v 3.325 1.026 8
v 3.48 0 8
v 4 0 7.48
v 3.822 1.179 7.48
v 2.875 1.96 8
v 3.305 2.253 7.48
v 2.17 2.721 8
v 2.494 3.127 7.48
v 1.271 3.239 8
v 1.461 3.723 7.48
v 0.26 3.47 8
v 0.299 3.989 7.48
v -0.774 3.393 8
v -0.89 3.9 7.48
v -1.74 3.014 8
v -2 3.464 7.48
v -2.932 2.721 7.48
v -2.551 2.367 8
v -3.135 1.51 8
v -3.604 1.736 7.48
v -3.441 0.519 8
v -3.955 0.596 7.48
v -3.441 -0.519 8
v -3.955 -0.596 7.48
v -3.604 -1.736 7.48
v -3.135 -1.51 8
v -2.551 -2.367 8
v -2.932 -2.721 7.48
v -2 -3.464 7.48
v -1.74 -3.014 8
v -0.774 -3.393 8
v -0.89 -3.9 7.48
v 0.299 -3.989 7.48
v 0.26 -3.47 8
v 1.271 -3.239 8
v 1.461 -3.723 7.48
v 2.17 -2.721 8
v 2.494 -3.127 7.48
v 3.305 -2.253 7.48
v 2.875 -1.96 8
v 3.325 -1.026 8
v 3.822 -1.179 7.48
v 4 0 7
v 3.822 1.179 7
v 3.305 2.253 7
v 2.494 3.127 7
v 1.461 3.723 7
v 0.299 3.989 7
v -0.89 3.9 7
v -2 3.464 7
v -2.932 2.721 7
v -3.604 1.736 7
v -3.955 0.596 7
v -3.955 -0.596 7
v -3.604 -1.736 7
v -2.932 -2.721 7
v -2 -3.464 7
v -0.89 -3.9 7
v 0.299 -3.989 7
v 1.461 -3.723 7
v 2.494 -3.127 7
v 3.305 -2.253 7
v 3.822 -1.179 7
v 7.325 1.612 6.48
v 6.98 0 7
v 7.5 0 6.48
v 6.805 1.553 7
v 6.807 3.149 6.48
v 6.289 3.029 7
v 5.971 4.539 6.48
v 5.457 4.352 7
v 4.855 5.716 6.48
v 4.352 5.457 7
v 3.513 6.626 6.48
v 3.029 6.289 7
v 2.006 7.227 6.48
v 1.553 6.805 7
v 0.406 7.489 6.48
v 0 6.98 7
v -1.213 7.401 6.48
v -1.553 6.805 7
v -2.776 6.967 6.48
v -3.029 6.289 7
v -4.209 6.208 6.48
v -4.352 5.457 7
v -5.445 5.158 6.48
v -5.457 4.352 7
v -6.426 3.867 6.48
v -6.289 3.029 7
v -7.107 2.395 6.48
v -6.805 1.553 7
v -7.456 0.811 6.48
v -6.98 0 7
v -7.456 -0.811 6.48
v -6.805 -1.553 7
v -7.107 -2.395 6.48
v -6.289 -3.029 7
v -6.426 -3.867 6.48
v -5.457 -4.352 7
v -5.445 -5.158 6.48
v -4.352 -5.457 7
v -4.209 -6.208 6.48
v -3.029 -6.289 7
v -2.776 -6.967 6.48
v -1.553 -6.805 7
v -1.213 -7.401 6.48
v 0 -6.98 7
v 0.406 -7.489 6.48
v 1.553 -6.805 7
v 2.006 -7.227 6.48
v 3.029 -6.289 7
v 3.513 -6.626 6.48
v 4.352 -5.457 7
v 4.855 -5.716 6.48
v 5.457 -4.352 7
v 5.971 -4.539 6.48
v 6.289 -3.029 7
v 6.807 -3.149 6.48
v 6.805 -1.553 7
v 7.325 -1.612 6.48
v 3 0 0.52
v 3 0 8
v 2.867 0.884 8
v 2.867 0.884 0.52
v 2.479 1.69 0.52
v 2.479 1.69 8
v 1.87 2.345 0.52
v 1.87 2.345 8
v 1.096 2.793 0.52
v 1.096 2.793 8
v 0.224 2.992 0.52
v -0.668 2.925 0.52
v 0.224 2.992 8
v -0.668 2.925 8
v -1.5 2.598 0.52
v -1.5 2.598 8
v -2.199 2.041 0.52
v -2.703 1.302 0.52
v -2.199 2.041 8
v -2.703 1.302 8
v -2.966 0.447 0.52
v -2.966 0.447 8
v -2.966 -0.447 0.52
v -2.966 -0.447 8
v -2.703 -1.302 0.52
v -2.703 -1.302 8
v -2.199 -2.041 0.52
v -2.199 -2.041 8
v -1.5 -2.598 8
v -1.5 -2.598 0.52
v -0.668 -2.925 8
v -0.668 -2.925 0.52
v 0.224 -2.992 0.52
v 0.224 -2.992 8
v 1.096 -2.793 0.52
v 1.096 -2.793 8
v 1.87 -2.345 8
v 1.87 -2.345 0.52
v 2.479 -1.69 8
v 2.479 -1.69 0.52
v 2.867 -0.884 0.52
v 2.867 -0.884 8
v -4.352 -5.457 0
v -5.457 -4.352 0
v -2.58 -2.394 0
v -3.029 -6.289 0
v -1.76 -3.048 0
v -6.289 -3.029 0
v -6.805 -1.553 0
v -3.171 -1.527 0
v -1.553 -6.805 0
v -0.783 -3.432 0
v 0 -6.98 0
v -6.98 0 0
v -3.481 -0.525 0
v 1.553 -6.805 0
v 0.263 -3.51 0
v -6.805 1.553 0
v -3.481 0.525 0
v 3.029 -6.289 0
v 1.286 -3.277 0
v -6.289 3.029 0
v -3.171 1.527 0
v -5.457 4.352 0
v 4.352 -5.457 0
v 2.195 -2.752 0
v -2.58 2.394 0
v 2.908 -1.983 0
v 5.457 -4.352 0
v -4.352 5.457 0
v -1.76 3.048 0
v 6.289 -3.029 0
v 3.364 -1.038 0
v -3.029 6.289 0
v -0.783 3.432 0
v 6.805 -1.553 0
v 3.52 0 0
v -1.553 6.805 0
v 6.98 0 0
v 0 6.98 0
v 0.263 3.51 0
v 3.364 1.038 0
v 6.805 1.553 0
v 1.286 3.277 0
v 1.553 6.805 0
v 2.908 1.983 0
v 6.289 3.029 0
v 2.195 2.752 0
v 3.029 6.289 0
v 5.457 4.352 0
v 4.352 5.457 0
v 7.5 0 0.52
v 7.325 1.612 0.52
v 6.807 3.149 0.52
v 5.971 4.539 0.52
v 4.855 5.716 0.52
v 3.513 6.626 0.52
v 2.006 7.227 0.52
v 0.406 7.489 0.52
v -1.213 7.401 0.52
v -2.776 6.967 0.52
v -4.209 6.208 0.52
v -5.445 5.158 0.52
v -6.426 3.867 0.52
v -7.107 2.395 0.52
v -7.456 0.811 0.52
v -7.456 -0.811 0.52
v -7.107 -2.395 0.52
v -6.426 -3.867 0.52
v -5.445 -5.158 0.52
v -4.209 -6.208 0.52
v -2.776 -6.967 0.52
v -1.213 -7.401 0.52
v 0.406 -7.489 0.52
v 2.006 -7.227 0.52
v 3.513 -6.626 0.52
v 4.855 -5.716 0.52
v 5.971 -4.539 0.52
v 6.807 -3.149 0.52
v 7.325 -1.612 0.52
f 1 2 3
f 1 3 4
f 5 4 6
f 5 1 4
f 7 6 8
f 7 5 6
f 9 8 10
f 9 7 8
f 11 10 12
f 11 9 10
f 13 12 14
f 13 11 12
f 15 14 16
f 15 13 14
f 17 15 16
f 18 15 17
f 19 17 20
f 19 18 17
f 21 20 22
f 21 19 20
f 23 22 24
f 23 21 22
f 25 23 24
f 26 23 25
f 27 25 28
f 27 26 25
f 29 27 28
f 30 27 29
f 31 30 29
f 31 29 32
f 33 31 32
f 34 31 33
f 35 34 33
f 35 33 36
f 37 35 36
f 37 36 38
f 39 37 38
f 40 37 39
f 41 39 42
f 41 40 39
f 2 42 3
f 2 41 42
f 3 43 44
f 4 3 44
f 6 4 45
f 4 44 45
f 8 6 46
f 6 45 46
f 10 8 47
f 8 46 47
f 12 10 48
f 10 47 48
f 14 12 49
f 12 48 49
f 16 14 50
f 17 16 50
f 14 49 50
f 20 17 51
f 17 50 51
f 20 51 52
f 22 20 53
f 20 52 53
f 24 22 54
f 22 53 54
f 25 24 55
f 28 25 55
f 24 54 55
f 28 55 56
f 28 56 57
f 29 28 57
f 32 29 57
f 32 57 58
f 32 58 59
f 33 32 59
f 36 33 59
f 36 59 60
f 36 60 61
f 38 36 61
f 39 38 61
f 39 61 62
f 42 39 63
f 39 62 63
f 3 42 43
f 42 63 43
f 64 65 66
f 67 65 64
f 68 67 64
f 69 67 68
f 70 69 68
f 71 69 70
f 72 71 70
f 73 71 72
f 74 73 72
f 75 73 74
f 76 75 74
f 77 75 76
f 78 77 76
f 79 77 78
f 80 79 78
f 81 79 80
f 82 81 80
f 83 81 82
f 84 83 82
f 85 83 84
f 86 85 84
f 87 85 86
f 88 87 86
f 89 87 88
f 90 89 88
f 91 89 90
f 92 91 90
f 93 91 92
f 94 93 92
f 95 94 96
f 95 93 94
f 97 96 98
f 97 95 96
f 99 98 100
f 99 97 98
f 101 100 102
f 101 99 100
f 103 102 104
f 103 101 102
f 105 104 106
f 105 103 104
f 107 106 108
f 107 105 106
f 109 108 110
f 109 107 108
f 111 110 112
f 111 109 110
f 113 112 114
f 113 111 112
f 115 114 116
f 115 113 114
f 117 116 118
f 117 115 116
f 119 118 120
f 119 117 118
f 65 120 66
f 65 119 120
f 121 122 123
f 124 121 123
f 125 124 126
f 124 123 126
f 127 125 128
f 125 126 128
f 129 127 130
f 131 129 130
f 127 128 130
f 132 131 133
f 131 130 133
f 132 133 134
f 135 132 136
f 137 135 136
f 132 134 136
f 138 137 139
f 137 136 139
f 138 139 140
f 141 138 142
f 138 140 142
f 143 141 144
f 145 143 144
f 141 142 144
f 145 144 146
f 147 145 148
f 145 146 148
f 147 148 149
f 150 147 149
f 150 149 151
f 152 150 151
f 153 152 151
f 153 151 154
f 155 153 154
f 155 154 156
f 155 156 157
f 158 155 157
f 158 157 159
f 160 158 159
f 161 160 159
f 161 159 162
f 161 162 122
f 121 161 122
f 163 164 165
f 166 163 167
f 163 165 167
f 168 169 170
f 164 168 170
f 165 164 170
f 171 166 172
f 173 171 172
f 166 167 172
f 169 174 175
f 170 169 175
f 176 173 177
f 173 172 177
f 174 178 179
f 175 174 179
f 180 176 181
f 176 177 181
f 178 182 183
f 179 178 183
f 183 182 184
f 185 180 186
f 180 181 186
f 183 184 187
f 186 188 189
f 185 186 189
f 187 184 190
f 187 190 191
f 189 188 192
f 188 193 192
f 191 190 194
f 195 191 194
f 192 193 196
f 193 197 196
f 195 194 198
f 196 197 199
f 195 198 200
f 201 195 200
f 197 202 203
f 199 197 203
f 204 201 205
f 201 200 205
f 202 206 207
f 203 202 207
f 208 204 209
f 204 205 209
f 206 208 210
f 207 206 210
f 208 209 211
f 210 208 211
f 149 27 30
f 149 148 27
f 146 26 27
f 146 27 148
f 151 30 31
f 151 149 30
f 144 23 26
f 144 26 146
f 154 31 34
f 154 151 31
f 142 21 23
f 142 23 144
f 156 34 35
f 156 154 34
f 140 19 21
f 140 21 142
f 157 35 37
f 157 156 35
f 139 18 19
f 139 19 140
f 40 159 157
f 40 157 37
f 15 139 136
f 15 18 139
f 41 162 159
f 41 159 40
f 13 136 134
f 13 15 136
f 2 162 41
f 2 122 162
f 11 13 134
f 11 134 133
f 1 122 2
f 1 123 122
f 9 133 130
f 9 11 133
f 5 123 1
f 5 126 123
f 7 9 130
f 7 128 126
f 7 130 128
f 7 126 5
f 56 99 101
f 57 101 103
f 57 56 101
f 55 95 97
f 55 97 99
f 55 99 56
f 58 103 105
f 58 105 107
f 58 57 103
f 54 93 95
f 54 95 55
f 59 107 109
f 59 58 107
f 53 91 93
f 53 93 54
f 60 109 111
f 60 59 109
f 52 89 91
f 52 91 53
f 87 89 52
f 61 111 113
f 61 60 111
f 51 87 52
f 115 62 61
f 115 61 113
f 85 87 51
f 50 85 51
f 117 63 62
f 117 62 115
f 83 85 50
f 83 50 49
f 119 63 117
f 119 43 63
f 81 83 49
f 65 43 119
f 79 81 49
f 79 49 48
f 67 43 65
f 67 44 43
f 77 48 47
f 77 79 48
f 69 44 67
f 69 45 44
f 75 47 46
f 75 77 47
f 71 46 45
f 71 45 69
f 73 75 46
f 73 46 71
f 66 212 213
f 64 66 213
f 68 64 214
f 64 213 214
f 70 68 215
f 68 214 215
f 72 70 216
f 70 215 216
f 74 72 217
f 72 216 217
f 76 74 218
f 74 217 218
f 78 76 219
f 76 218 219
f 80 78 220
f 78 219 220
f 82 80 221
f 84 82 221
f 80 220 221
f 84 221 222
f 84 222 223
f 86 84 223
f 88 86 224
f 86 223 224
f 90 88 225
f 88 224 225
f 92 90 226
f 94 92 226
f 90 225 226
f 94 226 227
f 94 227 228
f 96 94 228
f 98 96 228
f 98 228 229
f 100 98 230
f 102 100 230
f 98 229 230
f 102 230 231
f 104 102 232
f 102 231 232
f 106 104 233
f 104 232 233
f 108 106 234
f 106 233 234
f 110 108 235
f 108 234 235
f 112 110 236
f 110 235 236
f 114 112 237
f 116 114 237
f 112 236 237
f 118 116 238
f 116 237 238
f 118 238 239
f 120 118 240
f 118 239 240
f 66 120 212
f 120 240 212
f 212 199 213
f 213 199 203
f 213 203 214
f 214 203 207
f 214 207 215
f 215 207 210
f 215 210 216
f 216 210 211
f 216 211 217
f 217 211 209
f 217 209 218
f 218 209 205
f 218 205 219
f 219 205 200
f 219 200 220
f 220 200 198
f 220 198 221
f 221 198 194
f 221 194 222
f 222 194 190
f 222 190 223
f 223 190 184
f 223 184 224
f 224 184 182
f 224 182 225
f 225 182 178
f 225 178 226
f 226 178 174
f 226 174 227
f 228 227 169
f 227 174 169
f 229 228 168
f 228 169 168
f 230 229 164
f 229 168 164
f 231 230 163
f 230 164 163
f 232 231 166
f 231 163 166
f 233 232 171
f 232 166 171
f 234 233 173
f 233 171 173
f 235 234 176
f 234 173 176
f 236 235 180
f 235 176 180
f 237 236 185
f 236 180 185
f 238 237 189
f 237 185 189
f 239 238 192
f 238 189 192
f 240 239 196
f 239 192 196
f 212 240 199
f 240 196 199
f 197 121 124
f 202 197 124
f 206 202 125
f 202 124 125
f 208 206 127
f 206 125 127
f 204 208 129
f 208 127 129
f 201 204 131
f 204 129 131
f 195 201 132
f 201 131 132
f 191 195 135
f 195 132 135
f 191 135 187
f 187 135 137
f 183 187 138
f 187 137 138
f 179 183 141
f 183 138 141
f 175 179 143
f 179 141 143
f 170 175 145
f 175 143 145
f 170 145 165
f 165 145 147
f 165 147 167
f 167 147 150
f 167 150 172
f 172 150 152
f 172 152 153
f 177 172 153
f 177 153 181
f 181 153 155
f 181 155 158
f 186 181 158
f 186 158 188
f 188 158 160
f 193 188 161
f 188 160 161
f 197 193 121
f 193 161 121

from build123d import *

# Parameters (mm, degrees)
SKETCH1_R           = 7.5
BOSS_EXTRUDE1_DEPTH = 7
SKETCH2_R           = 4
BOSS_EXTRUDE2_DEPTH = 1
SKETCH3_R           = 3
CUT_EXTRUDE1_DEPTH  = 9
CHAMFER1_SIZE       = 0.52


with BuildPart() as part:
    # Sketch1 → Boss-Extrude1 (new body)
    with BuildSketch(Plane.XY):
        Circle(SKETCH1_R)
    extrude(amount=BOSS_EXTRUDE1_DEPTH)

    # Sketch2 → Boss-Extrude2 (add)
    with BuildSketch(Plane.XY.offset(7)):
        Circle(SKETCH2_R)
    extrude(amount=BOSS_EXTRUDE2_DEPTH)

    # Sketch3 → Cut-Extrude1 (cut, through all)
    with BuildSketch(Plane.XY.offset(8)):
        Circle(SKETCH3_R)
    extrude(amount=-CUT_EXTRUDE1_DEPTH, mode=Mode.SUBTRACT)

    # Chamfer1
    chamfer1_edges = [part.edges().sort_by_distance(p)[0] for p in [
        (-3, 0, 0),
        (-7.5, 0, 0),
        (-7.5, 0, 7),
        (-4, 0, 8),
    ]]
    chamfer(chamfer1_edges, length=CHAMFER1_SIZE)


solid = part.part
